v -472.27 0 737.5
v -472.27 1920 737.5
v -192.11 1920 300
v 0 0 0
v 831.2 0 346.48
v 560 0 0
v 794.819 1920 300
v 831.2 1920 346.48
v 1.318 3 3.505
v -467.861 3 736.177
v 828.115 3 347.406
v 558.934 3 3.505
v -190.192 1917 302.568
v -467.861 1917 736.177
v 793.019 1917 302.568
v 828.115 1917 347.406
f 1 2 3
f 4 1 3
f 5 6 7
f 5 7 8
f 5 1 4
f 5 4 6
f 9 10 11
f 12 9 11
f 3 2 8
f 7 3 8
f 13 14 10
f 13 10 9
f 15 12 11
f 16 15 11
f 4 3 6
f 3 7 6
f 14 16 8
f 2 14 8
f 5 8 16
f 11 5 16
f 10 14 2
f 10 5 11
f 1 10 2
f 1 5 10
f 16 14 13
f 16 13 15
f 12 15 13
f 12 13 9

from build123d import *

# Parameters (mm, degrees)
F1_DEPTH      = 1920
F3_DEPTH      = 831.201
F3_DEPTH_BACK = 472.271
F4_T          = -3


with BuildPart() as f1:
    # F0 (on Front) → F1 (new body)
    with BuildSketch(Plane.XZ):
        Polygon((-472.27, 737.5), (0, 0), (560, 0), (831.2, 346.48), align=None)
    extrude(amount=-F1_DEPTH)

    # F2 (on Right) → F3 (cut, two sides)
    with BuildSketch(Plane.YZ) as f3_sk:
        Polygon((0, 0), (1920, 0), (1920, 300), align=None)
    extrude(amount=F3_DEPTH, mode=Mode.SUBTRACT)
    extrude(f3_sk.sketch, amount=-F3_DEPTH_BACK, mode=Mode.SUBTRACT)

    # F4
    f4_openings = [f1.faces().sort_by_distance(p)[0] for p in [
        (179.465, 960, 541.99),
    ]]
    offset(amount=F4_T, openings=f4_openings)


solid = f1.part
